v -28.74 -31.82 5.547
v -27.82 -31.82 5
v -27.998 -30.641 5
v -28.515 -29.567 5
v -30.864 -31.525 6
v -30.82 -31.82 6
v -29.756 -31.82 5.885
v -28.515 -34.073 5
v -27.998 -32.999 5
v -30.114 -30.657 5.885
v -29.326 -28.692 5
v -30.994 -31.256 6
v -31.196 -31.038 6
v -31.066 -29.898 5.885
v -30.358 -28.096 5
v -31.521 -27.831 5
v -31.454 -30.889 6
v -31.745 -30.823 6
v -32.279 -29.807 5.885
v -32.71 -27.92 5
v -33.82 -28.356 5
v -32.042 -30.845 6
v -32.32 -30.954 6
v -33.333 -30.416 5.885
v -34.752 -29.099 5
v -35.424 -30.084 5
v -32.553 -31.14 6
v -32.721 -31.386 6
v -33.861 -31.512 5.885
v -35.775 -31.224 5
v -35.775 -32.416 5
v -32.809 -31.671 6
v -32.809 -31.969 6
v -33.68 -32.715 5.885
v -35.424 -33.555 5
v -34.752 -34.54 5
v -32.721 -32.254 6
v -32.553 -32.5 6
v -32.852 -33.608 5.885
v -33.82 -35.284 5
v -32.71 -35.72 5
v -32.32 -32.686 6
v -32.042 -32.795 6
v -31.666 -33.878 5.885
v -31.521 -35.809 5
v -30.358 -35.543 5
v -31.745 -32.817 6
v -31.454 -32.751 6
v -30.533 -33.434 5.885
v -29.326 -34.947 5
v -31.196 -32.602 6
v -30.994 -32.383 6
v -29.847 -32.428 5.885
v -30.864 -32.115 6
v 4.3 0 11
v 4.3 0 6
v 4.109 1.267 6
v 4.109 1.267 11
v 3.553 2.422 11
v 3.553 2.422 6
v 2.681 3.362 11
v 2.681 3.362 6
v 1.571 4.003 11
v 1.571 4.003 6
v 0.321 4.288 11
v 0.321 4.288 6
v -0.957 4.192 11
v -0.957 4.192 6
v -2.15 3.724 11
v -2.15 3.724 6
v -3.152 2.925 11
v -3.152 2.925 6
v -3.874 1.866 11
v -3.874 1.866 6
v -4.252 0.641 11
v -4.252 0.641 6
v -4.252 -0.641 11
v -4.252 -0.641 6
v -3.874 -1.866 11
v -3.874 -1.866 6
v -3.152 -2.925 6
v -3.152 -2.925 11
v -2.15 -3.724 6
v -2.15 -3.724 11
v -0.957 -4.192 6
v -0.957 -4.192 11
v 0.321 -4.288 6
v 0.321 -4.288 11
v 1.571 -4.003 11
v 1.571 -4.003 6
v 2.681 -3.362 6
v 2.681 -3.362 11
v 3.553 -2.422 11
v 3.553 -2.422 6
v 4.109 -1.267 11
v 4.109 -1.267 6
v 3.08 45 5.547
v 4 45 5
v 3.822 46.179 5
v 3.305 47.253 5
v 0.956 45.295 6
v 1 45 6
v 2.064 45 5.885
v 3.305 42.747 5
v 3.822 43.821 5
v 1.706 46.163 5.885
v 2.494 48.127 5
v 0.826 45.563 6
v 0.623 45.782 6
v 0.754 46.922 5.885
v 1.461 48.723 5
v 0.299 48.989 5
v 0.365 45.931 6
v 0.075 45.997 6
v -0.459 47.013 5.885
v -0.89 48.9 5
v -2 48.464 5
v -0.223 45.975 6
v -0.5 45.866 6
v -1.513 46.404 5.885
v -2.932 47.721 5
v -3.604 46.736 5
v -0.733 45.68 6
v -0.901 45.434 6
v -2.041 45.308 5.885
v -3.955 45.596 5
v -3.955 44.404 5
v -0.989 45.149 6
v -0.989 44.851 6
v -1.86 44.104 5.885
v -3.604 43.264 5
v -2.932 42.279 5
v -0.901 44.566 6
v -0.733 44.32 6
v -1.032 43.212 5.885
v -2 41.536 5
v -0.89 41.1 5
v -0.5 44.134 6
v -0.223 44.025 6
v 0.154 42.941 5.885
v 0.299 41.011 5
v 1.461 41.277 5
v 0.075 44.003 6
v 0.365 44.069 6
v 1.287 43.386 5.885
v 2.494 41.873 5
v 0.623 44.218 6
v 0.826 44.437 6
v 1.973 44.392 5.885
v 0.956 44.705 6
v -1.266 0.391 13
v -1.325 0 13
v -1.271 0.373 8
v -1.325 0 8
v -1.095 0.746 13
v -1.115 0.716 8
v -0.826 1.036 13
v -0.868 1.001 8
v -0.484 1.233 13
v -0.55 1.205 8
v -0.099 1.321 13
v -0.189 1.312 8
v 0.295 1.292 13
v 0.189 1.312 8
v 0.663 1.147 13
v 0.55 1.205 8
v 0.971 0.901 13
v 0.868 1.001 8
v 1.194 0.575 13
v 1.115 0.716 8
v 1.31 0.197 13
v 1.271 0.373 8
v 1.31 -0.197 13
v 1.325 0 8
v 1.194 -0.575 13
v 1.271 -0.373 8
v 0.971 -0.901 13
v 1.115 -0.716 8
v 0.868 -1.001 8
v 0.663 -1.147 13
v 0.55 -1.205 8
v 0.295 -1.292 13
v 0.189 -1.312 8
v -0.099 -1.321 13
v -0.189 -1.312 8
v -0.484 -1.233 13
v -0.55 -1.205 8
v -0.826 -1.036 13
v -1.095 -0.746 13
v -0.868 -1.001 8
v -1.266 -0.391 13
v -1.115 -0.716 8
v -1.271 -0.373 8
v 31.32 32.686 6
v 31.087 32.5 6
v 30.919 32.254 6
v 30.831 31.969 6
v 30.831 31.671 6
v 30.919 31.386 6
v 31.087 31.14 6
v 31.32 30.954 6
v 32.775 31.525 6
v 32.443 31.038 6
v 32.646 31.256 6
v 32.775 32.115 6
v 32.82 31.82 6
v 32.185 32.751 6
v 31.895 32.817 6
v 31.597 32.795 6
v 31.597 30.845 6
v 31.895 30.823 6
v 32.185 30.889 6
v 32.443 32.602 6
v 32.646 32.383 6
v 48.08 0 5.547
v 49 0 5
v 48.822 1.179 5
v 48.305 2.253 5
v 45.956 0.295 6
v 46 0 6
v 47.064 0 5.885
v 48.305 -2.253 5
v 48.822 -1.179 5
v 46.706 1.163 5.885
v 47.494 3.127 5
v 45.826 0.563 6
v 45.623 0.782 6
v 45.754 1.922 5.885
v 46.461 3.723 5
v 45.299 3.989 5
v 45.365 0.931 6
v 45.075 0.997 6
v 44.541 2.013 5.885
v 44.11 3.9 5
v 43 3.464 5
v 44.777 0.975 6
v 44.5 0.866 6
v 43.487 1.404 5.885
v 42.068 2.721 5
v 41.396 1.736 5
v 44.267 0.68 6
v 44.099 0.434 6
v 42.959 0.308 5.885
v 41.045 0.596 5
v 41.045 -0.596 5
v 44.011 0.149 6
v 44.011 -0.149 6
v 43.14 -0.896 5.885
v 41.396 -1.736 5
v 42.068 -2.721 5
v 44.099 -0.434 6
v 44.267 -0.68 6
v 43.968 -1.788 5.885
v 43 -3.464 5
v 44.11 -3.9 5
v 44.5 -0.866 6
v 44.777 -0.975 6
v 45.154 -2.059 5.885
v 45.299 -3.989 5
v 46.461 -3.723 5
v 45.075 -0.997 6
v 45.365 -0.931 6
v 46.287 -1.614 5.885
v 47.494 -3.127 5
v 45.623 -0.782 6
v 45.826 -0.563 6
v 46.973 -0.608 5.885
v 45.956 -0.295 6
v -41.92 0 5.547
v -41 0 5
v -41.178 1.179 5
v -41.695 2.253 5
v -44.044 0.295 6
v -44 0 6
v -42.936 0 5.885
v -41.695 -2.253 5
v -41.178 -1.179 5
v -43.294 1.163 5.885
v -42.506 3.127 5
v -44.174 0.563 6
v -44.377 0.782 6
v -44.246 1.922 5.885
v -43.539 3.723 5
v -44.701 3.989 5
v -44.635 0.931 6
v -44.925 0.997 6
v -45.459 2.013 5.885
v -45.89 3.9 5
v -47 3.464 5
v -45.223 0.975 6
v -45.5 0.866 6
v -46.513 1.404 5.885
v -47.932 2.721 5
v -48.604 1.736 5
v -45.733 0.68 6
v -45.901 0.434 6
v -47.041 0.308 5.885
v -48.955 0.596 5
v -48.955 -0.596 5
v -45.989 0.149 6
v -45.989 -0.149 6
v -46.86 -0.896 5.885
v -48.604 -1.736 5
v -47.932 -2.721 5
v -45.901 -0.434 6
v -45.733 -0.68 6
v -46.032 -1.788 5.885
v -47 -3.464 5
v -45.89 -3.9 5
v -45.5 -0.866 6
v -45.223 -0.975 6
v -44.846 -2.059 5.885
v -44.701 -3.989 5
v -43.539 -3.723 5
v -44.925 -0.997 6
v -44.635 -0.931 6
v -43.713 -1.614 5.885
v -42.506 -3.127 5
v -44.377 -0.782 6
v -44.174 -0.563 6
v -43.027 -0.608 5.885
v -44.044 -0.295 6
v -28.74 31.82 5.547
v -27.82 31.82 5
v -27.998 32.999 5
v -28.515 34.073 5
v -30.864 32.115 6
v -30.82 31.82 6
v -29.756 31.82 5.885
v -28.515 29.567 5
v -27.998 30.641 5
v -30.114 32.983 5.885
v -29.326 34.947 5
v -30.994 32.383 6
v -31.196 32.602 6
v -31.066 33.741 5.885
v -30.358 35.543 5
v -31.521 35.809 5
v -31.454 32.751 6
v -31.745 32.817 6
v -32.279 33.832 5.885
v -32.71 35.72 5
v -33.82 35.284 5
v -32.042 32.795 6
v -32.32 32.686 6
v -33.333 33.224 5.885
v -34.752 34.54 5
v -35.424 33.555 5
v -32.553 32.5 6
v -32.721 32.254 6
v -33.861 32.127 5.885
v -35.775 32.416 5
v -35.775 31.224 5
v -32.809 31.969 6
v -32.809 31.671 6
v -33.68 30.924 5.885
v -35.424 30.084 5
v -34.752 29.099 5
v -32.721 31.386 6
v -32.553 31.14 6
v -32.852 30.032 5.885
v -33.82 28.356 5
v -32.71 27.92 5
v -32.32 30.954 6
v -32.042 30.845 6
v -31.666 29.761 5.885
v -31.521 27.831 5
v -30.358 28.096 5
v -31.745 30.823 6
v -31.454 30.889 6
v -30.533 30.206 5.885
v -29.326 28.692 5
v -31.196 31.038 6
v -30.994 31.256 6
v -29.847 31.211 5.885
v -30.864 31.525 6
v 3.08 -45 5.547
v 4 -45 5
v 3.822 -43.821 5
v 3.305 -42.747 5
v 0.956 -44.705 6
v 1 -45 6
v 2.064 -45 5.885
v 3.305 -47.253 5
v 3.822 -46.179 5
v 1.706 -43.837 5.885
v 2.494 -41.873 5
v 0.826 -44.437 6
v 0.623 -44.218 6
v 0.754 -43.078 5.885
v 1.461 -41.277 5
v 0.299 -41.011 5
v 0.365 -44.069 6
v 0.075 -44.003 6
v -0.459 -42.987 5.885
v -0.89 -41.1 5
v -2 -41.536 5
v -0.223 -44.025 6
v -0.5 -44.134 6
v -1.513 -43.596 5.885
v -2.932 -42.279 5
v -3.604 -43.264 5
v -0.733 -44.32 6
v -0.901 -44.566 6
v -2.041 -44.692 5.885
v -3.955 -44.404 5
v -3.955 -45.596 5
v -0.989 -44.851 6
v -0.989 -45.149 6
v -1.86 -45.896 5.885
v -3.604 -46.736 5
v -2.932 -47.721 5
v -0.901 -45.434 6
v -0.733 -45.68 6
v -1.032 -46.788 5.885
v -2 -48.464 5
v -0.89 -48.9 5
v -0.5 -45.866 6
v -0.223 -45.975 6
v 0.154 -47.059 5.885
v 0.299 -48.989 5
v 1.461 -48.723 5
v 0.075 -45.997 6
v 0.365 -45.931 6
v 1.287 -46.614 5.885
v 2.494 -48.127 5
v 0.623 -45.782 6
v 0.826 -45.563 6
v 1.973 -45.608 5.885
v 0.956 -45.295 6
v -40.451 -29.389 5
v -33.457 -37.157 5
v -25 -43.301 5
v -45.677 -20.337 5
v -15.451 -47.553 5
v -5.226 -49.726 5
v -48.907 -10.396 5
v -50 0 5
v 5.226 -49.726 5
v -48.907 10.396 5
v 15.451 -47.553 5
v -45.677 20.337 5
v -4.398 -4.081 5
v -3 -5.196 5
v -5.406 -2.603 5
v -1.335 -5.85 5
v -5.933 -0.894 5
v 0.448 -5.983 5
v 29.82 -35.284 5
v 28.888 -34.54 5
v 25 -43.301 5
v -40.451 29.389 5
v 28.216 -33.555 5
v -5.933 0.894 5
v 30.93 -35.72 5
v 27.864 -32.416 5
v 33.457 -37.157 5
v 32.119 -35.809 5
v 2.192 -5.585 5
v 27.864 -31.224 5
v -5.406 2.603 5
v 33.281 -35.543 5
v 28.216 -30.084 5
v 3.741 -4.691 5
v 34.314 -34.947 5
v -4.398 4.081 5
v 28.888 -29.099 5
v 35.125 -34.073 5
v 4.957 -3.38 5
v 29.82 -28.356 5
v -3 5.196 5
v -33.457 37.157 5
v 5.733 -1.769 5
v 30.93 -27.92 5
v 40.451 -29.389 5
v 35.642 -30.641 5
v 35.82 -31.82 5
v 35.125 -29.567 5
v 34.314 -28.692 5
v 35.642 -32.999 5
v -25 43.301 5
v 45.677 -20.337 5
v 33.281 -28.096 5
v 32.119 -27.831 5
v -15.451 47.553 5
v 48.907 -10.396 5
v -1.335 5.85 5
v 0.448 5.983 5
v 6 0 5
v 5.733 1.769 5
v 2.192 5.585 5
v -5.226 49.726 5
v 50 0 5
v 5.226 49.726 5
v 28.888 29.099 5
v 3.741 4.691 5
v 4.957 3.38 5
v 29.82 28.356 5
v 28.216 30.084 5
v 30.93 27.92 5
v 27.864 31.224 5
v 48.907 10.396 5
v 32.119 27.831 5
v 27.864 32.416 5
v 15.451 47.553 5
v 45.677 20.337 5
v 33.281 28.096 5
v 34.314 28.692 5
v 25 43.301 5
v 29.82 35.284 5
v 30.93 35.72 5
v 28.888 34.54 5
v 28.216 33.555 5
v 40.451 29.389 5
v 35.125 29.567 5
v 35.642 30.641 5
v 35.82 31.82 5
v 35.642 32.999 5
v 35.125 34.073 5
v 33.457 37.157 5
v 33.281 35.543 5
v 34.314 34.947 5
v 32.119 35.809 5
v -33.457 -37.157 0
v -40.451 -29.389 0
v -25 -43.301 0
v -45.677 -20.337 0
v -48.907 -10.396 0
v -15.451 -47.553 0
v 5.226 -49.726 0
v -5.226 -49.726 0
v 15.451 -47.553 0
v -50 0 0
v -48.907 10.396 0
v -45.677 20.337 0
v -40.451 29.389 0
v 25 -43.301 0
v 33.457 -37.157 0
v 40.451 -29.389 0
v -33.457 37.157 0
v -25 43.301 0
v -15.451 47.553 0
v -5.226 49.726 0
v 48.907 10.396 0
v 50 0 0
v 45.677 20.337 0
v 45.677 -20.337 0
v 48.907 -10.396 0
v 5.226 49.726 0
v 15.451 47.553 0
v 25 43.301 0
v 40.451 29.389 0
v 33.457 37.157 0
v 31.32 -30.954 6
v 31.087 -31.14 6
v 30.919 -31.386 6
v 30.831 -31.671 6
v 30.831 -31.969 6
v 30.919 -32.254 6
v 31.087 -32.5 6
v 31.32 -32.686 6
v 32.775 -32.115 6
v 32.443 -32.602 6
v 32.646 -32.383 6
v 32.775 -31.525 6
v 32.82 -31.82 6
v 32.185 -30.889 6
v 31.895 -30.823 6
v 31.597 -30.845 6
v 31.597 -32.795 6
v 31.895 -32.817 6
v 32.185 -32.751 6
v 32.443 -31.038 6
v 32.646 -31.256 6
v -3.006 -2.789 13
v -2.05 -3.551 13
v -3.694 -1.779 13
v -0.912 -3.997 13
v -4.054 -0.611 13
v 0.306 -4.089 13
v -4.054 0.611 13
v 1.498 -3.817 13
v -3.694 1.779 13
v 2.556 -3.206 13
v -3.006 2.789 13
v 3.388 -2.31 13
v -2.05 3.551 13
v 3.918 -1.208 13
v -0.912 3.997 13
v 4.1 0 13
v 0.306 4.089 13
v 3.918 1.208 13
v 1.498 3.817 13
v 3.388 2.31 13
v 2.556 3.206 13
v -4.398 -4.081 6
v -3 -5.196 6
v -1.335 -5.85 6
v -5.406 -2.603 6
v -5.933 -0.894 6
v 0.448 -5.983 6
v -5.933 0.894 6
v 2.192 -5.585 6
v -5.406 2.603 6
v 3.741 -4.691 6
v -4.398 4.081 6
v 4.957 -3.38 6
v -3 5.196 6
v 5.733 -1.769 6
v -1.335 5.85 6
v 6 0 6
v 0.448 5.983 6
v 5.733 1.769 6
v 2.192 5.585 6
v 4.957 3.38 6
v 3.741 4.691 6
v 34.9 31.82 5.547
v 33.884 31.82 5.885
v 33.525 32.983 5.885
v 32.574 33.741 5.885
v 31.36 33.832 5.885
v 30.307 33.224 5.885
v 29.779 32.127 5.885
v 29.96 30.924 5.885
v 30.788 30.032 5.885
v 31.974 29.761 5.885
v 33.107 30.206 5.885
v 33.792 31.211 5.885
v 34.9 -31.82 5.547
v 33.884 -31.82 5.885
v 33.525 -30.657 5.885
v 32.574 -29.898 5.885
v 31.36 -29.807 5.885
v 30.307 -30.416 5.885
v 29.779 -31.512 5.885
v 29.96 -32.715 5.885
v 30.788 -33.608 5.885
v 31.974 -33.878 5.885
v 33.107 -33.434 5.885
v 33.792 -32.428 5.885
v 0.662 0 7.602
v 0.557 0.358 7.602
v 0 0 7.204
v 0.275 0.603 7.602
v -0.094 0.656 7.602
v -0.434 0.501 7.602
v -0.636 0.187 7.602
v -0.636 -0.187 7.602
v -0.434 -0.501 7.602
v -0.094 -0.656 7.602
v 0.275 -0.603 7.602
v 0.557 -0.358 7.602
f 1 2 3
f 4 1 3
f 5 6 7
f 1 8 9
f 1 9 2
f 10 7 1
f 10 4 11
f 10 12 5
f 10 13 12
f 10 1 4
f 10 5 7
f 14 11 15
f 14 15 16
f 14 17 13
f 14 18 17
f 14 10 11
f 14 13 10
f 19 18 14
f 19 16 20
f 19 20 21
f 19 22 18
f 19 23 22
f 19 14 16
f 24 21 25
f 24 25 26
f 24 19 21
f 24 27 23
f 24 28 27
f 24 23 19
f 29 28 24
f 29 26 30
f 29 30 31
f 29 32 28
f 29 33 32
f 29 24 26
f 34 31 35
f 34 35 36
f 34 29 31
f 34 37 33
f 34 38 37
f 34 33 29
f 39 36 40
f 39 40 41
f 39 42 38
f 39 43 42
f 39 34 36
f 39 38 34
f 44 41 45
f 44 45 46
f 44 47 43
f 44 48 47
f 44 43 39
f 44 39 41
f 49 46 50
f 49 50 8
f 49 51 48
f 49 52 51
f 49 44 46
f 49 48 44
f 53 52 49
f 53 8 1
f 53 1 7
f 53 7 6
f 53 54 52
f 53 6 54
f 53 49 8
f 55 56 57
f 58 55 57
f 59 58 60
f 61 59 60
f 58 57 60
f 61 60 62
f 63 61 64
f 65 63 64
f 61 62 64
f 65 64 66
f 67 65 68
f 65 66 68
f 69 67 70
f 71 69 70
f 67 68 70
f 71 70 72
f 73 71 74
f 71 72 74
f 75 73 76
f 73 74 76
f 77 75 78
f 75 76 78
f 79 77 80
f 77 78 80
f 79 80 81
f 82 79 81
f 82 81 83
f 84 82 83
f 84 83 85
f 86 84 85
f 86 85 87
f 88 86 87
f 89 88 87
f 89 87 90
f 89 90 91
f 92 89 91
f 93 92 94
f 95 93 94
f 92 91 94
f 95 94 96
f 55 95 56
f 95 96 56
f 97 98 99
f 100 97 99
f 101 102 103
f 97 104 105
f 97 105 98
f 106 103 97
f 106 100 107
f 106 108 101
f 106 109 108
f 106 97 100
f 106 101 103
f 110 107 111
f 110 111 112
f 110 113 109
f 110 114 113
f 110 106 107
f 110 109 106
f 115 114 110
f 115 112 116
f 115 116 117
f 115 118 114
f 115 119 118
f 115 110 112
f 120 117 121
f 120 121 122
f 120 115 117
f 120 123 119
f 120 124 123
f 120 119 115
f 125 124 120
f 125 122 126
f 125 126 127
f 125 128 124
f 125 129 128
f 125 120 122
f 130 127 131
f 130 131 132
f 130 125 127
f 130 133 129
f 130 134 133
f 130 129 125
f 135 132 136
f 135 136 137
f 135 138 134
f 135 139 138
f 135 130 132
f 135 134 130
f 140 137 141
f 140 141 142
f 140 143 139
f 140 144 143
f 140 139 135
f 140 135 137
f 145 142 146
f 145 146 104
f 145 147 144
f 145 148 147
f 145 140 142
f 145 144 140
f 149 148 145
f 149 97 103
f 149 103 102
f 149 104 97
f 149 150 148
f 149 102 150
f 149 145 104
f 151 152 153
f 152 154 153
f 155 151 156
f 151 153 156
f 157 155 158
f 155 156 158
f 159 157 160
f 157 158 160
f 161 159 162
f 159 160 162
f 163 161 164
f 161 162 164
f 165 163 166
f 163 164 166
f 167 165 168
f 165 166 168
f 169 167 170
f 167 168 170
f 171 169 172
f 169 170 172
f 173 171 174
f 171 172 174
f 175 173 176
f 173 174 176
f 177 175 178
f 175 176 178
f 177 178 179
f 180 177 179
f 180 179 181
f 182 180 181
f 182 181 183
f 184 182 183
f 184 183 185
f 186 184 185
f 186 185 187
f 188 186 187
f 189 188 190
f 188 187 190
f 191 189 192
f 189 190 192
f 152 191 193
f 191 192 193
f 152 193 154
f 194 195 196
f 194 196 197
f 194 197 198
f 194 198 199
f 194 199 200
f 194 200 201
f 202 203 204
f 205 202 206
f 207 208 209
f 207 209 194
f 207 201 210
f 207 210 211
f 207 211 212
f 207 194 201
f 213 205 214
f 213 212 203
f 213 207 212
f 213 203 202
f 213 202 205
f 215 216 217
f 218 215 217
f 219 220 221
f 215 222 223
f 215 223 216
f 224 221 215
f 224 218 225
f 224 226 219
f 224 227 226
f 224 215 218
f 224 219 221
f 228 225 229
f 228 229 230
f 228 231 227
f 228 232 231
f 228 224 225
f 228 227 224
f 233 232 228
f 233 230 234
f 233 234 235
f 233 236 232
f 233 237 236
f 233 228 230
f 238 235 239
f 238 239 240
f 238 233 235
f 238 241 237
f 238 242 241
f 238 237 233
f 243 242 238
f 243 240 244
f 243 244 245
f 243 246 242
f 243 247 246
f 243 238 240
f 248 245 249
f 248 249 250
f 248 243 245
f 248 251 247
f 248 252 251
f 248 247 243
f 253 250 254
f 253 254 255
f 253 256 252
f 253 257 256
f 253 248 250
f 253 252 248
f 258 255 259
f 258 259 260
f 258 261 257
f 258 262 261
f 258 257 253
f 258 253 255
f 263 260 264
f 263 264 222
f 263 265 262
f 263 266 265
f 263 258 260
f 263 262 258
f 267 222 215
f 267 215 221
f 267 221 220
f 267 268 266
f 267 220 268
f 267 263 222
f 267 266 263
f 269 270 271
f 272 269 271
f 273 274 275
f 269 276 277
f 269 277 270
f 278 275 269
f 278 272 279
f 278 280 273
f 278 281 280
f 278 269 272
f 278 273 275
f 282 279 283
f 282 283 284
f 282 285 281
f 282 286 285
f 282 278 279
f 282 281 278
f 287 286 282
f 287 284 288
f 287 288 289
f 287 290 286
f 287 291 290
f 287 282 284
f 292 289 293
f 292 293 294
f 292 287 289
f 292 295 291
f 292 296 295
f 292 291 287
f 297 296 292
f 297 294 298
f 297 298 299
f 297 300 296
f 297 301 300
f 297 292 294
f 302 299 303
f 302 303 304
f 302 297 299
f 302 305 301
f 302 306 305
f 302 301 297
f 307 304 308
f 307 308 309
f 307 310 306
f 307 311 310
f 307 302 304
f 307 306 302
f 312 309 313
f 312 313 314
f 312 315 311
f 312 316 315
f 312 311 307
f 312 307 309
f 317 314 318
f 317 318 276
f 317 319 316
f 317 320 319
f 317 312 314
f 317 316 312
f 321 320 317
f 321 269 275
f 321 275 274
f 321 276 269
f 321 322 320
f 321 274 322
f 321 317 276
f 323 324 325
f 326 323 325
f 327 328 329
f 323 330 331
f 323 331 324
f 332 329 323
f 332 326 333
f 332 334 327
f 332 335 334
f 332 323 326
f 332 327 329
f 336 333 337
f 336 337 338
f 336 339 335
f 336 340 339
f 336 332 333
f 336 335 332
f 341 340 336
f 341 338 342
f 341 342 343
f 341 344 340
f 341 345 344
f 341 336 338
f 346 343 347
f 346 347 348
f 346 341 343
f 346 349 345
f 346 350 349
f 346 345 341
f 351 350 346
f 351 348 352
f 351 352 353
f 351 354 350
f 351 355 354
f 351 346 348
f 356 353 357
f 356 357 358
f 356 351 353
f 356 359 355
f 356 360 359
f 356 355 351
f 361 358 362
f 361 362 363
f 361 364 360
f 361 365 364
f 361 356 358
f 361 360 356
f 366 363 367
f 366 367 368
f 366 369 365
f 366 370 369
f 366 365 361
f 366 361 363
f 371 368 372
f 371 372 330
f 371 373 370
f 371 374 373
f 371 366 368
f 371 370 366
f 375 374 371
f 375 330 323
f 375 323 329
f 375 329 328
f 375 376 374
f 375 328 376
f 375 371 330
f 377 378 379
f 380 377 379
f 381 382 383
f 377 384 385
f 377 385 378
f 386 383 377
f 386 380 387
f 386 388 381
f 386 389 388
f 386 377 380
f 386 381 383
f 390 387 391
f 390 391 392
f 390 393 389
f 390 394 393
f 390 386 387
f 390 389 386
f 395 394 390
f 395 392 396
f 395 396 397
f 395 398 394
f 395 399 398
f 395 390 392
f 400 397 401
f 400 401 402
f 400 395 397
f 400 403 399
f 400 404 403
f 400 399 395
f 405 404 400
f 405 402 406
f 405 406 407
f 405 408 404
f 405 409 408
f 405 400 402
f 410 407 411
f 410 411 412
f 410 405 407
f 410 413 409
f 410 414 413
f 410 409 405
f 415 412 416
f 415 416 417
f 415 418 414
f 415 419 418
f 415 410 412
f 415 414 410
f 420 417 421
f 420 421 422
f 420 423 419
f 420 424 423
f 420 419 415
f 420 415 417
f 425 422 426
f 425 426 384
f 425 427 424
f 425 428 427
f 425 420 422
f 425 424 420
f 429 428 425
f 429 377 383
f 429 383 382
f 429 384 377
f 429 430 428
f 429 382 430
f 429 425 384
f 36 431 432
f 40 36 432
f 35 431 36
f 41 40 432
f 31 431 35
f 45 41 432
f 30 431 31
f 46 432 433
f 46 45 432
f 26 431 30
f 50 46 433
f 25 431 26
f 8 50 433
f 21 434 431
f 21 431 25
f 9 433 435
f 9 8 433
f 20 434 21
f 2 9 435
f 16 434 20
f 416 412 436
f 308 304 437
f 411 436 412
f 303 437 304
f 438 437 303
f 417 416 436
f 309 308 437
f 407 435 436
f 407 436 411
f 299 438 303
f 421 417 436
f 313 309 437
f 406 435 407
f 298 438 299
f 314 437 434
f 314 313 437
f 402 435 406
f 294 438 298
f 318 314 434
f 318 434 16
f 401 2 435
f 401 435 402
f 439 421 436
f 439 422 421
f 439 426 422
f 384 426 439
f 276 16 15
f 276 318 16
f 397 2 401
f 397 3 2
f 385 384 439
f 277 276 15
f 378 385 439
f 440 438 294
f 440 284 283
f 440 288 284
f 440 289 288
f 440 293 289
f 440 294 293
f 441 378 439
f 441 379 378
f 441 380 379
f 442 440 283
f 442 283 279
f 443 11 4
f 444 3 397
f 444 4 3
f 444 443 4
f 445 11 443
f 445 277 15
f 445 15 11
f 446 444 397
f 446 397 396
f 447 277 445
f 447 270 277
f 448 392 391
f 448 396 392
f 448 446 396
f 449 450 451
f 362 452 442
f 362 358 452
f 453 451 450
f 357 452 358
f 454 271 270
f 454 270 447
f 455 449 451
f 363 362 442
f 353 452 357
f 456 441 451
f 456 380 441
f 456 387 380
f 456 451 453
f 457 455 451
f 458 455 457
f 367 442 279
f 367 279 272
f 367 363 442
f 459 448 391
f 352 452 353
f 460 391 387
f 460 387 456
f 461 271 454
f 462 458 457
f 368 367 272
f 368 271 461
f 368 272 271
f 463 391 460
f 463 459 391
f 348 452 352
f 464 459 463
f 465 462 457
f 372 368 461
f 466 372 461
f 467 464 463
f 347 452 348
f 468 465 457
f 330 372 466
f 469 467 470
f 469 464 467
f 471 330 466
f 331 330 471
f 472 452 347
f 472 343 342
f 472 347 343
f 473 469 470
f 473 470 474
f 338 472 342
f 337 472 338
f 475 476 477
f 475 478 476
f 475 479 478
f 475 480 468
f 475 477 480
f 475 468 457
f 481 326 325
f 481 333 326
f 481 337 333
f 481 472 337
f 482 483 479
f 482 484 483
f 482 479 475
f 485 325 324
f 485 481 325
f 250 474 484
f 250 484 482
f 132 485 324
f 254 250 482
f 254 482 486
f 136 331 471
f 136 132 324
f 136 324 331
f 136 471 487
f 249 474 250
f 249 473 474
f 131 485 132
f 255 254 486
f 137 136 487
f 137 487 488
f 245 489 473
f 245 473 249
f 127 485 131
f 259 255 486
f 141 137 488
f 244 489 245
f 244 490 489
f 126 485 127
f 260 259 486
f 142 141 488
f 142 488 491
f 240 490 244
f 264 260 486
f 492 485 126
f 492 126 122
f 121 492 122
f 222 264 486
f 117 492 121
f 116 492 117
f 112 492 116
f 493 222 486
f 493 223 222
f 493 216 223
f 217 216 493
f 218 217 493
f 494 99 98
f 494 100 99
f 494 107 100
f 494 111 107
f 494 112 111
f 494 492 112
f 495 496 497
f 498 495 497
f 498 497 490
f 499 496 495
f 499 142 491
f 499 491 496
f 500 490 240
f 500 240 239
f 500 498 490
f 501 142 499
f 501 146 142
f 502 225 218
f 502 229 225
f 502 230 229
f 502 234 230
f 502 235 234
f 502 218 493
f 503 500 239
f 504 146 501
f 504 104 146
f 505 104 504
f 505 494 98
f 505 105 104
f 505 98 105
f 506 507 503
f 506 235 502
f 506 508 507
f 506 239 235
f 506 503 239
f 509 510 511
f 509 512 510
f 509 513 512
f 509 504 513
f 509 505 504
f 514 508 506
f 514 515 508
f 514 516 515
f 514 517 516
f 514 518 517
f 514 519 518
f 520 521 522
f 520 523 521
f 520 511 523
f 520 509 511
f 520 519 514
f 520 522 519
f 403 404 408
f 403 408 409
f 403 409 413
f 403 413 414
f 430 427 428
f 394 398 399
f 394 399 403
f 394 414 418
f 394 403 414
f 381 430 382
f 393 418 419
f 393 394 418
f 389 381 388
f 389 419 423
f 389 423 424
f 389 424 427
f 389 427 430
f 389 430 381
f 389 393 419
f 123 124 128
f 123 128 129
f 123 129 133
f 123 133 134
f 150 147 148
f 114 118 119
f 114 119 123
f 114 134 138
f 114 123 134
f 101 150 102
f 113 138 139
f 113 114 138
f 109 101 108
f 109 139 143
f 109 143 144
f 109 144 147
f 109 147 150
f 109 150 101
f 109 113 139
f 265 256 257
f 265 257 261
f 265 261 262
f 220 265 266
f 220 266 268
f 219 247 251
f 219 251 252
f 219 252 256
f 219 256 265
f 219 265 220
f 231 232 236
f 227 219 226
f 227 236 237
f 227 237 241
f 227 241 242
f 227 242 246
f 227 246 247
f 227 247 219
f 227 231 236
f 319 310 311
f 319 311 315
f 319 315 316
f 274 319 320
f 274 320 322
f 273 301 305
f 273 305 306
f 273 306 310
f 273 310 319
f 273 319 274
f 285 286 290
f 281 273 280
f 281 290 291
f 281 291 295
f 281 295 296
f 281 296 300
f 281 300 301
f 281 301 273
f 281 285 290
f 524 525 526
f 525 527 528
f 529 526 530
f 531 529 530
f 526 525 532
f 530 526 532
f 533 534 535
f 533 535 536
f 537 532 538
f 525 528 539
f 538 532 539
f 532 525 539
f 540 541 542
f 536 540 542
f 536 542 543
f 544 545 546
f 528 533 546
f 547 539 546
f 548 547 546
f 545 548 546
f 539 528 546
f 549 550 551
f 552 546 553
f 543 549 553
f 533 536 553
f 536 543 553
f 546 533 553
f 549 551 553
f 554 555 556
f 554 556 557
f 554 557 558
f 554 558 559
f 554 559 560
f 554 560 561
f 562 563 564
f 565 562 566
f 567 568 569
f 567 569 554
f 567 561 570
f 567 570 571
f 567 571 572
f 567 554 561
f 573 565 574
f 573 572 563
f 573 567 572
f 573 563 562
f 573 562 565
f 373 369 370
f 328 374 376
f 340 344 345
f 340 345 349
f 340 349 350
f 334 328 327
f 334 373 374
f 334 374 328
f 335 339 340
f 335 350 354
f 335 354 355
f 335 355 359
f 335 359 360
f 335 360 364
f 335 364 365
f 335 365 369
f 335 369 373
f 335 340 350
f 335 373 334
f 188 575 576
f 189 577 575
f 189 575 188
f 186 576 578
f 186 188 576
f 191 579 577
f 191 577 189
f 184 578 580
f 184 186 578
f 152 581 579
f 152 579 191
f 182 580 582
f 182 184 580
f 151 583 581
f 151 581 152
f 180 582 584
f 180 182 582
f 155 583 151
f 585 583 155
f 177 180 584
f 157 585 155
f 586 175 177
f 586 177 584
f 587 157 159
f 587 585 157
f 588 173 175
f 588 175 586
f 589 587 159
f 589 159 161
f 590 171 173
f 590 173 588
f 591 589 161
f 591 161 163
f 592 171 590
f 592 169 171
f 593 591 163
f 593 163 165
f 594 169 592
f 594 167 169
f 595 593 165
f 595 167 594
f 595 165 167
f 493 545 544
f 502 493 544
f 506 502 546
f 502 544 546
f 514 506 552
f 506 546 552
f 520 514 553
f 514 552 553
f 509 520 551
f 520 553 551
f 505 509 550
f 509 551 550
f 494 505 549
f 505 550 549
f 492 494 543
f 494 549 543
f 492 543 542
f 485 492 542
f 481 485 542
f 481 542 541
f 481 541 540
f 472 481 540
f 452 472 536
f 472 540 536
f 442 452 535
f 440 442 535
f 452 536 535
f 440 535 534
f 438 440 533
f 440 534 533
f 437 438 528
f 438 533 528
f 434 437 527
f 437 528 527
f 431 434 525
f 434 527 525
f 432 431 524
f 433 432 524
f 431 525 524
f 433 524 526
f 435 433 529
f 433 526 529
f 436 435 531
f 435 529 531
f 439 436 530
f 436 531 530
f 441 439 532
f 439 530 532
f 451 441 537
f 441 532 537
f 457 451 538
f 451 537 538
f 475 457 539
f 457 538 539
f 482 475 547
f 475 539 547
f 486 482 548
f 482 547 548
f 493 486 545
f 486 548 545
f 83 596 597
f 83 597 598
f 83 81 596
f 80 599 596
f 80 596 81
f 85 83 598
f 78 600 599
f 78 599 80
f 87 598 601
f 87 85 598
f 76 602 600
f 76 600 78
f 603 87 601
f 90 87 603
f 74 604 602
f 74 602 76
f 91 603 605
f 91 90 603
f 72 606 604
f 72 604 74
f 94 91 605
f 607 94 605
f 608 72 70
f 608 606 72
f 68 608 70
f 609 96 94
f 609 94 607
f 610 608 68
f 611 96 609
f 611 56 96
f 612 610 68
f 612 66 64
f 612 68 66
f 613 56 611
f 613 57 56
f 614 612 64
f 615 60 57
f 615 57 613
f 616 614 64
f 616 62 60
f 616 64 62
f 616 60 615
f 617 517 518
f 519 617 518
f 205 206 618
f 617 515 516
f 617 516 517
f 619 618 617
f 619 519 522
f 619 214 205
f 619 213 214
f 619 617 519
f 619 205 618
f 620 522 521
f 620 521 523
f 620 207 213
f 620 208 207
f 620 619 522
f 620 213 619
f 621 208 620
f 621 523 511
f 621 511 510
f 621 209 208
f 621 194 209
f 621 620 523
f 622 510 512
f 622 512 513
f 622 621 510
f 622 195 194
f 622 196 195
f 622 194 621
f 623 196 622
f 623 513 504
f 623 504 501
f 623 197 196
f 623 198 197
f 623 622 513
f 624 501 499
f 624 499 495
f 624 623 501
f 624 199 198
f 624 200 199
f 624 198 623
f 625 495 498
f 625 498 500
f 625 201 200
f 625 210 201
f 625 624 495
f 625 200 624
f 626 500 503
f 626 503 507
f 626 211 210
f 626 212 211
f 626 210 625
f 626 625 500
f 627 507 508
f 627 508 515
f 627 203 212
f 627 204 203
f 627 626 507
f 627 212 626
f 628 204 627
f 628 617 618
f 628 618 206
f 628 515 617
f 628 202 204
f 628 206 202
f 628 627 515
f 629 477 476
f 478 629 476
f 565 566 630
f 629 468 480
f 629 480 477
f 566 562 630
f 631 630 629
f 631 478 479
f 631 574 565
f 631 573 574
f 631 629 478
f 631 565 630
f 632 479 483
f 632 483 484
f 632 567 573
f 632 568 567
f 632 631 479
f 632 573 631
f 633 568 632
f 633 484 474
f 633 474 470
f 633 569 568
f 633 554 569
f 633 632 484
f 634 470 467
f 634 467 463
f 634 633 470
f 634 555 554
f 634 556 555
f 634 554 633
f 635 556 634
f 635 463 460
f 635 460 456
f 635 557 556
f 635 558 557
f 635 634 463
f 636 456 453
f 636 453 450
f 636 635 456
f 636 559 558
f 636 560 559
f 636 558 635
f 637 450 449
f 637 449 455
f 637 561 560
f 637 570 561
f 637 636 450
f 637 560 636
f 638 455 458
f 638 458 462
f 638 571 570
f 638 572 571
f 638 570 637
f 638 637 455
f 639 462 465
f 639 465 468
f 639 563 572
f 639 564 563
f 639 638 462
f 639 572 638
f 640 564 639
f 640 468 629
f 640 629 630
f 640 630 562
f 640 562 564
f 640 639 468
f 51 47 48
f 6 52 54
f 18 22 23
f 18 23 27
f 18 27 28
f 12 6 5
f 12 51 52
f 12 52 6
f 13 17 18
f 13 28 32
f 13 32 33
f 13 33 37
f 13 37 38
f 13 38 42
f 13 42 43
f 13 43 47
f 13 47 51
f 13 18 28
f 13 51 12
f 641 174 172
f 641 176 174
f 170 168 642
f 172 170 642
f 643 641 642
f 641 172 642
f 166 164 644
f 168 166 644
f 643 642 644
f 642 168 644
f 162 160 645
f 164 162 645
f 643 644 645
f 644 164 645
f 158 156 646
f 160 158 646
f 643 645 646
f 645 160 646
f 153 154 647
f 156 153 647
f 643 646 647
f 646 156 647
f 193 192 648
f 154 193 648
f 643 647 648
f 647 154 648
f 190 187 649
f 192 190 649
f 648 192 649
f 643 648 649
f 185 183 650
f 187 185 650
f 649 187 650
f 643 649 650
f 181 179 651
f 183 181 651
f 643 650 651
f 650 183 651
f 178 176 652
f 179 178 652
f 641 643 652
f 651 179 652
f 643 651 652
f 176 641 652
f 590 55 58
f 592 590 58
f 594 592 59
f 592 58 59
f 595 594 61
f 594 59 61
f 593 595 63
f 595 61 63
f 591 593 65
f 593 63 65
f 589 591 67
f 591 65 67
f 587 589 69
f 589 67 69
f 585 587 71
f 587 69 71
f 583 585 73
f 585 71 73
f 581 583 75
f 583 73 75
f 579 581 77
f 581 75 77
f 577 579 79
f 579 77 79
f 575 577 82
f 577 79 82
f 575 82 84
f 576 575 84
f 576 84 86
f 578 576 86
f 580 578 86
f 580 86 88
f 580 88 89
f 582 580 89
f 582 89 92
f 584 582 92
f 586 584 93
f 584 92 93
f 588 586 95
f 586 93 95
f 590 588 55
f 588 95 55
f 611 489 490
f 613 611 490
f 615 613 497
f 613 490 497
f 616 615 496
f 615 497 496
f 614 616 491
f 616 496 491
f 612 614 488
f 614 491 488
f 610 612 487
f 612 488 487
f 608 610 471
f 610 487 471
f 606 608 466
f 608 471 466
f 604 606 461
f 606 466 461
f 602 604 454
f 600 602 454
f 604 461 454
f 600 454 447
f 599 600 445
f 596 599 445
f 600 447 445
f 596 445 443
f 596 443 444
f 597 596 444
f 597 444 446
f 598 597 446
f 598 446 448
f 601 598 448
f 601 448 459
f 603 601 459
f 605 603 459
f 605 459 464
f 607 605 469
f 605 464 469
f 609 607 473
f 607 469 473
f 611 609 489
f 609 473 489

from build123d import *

# Parameters (mm, degrees)
F0_R      = 50
F1_DEPTH  = 5
F2_R      = 6
F3_DEPTH  = 1
F4_R      = 4.3
F5_DEPTH  = 7
F7_D      = 2.65
F7_DEPTH  = 5
F7_TIP    = 0.7961403202
F8_SIZE2  = 2
F8_SIZE   = 0.2
F9_R      = 4
F10_DEPTH = 1


# Not quite as in the source:
# - a fillet or chamfer that OpenCascade refuses, or shapes differently, is made with other operations: its cross-section is extruded or revolved along the edge and cut away or added


with BuildPart() as f1:
    # F0 (on Top) → F1 (new body)
    with BuildSketch(Plane.XY):
        Circle(F0_R)
    extrude(amount=F1_DEPTH)

    # F2 (on face) → F3 (join)
    with BuildSketch(Plane.XY.offset(5)):
        Circle(F2_R)
    extrude(amount=F3_DEPTH)

    # F4 (on face) → F5 (join)
    with BuildSketch(Plane.XY.offset(6)):
        Circle(F4_R)
    extrude(amount=F5_DEPTH)

    # F7
    with Locations(Plane.XY.offset(13)):
        with Locations((0, 0)):
            Hole(F7_D / 2, depth=F7_DEPTH)
            with Locations((0, 0, -(F7_DEPTH + F7_TIP / 2))):  # 118° drill point
                Cone(0, F7_D / 2, F7_TIP, mode=Mode.SUBTRACT)

    # F8
    f8_edges = [f1.edges().sort_by_distance(p)[0] for p in [
        (-4.3, 0, 13),
    ]]
    f8_side = f1.faces().sort_by_distance((-4.178378, 0, 13))[0]
    chamfer(f8_edges, length=F8_SIZE, length2=F8_SIZE2, reference=f8_side)

    # F9 (on face) → F10 (join)
    with BuildSketch(Plane.XY.offset(5)):
        with Locations((0, 45)):
            Circle(F9_R)
        with Locations((-31.8198051534, 31.8198051534)):
            Circle(F9_R)
        with Locations((-45, 0)):
            Circle(F9_R)
        with Locations((-31.8198051534, -31.8198051534)):
            Circle(F9_R)
        with Locations((0, -45)):
            Circle(F9_R)
        with Locations((31.8198051534, -31.8198051534)):
            Circle(F9_R)
        with Locations((45, 0)):
            Circle(F9_R)
        with Locations((31.8198051534, 31.8198051534)):
            Circle(F9_R)
    extrude(amount=F10_DEPTH)

    # F11: fillet of radius 5 on 8 edges, made by hand

    # F11_s1 → F11_t2 (revolve, cut)
    with BuildSketch(Plane.XZ.offset(45)):
        with BuildLine():
            ThreePointArc((4, 5), (2.5811388301, 5.7434164903), (1, 6))
            Line((1, 6), (4, 6))
            Line((4, 6), (4, 5))
        make_face()
    revolve(axis=Axis((0, -45, 6), (0, 0, 1)), mode=Mode.SUBTRACT)

    # F11_s3 → F11_t4 (revolve, cut)
    with BuildSketch(Plane.XZ.offset(31.8198051534)):
        with BuildLine():
            ThreePointArc((35.8198051534, 5), (34.4009439835, 5.7434164903), (32.8198051534, 6))
            Line((32.8198051534, 6), (35.8198051534, 6))
            Line((35.8198051534, 6), (35.8198051534, 5))
        make_face()
    revolve(axis=Axis((31.8198051534, -31.8198051534, 6), (0, 0, 1)), mode=Mode.SUBTRACT)

    # F11_s5 → F11_t6 (revolve, cut)
    with BuildSketch(Plane.XZ):
        with BuildLine():
            ThreePointArc((49, 5), (47.5811388301, 5.7434164903), (46, 6))
            Line((46, 6), (49, 6))
            Line((49, 6), (49, 5))
        make_face()
    revolve(axis=Axis((45, 0, 6), (0, 0, 1)), mode=Mode.SUBTRACT)

    # F11_s7 → F11_t8 (revolve, cut)
    with BuildSketch(Plane.XZ.offset(-31.8198051534)):
        with BuildLine():
            ThreePointArc((35.8198051534, 5), (34.4009439835, 5.7434164903), (32.8198051534, 6))
            Line((32.8198051534, 6), (35.8198051534, 6))
            Line((35.8198051534, 6), (35.8198051534, 5))
        make_face()
    revolve(axis=Axis((31.8198051534, 31.8198051534, 6), (0, 0, 1)), mode=Mode.SUBTRACT)

    # F11_s9 → F11_t10 (revolve, cut)
    with BuildSketch(Plane.XZ.offset(-45)):
        with BuildLine():
            ThreePointArc((4, 5), (2.5811388301, 5.7434164903), (1, 6))
            Line((1, 6), (4, 6))
            Line((4, 6), (4, 5))
        make_face()
    revolve(axis=Axis((0, 45, 6), (0, 0, 1)), mode=Mode.SUBTRACT)

    # F11_s11 → F11_t12 (revolve, cut)
    with BuildSketch(Plane.XZ.offset(-31.8198051534)):
        with BuildLine():
            ThreePointArc((-27.8198051534, 5), (-29.2386663233, 5.7434164903), (-30.8198051534, 6))
            Line((-30.8198051534, 6), (-27.8198051534, 6))
            Line((-27.8198051534, 6), (-27.8198051534, 5))
        make_face()
    revolve(axis=Axis((-31.8198051534, 31.8198051534, 6), (0, 0, 1)), mode=Mode.SUBTRACT)

    # F11_s13 → F11_t14 (revolve, cut)
    with BuildSketch(Plane.XZ):
        with BuildLine():
            ThreePointArc((-41, 5), (-42.4188611699, 5.7434164903), (-44, 6))
            Line((-44, 6), (-41, 6))
            Line((-41, 6), (-41, 5))
        make_face()
    revolve(axis=Axis((-45, 0, 6), (0, 0, 1)), mode=Mode.SUBTRACT)

    # F11_s15 → F11_t16 (revolve, cut)
    with BuildSketch(Plane.XZ.offset(31.8198051534)):
        with BuildLine():
            ThreePointArc((-27.8198051534, 5), (-29.2386663233, 5.7434164903), (-30.8198051534, 6))
            Line((-30.8198051534, 6), (-27.8198051534, 6))
            Line((-27.8198051534, 6), (-27.8198051534, 5))
        make_face()
    revolve(axis=Axis((-31.8198051534, -31.8198051534, 6), (0, 0, 1)), mode=Mode.SUBTRACT)


solid = f1.part
